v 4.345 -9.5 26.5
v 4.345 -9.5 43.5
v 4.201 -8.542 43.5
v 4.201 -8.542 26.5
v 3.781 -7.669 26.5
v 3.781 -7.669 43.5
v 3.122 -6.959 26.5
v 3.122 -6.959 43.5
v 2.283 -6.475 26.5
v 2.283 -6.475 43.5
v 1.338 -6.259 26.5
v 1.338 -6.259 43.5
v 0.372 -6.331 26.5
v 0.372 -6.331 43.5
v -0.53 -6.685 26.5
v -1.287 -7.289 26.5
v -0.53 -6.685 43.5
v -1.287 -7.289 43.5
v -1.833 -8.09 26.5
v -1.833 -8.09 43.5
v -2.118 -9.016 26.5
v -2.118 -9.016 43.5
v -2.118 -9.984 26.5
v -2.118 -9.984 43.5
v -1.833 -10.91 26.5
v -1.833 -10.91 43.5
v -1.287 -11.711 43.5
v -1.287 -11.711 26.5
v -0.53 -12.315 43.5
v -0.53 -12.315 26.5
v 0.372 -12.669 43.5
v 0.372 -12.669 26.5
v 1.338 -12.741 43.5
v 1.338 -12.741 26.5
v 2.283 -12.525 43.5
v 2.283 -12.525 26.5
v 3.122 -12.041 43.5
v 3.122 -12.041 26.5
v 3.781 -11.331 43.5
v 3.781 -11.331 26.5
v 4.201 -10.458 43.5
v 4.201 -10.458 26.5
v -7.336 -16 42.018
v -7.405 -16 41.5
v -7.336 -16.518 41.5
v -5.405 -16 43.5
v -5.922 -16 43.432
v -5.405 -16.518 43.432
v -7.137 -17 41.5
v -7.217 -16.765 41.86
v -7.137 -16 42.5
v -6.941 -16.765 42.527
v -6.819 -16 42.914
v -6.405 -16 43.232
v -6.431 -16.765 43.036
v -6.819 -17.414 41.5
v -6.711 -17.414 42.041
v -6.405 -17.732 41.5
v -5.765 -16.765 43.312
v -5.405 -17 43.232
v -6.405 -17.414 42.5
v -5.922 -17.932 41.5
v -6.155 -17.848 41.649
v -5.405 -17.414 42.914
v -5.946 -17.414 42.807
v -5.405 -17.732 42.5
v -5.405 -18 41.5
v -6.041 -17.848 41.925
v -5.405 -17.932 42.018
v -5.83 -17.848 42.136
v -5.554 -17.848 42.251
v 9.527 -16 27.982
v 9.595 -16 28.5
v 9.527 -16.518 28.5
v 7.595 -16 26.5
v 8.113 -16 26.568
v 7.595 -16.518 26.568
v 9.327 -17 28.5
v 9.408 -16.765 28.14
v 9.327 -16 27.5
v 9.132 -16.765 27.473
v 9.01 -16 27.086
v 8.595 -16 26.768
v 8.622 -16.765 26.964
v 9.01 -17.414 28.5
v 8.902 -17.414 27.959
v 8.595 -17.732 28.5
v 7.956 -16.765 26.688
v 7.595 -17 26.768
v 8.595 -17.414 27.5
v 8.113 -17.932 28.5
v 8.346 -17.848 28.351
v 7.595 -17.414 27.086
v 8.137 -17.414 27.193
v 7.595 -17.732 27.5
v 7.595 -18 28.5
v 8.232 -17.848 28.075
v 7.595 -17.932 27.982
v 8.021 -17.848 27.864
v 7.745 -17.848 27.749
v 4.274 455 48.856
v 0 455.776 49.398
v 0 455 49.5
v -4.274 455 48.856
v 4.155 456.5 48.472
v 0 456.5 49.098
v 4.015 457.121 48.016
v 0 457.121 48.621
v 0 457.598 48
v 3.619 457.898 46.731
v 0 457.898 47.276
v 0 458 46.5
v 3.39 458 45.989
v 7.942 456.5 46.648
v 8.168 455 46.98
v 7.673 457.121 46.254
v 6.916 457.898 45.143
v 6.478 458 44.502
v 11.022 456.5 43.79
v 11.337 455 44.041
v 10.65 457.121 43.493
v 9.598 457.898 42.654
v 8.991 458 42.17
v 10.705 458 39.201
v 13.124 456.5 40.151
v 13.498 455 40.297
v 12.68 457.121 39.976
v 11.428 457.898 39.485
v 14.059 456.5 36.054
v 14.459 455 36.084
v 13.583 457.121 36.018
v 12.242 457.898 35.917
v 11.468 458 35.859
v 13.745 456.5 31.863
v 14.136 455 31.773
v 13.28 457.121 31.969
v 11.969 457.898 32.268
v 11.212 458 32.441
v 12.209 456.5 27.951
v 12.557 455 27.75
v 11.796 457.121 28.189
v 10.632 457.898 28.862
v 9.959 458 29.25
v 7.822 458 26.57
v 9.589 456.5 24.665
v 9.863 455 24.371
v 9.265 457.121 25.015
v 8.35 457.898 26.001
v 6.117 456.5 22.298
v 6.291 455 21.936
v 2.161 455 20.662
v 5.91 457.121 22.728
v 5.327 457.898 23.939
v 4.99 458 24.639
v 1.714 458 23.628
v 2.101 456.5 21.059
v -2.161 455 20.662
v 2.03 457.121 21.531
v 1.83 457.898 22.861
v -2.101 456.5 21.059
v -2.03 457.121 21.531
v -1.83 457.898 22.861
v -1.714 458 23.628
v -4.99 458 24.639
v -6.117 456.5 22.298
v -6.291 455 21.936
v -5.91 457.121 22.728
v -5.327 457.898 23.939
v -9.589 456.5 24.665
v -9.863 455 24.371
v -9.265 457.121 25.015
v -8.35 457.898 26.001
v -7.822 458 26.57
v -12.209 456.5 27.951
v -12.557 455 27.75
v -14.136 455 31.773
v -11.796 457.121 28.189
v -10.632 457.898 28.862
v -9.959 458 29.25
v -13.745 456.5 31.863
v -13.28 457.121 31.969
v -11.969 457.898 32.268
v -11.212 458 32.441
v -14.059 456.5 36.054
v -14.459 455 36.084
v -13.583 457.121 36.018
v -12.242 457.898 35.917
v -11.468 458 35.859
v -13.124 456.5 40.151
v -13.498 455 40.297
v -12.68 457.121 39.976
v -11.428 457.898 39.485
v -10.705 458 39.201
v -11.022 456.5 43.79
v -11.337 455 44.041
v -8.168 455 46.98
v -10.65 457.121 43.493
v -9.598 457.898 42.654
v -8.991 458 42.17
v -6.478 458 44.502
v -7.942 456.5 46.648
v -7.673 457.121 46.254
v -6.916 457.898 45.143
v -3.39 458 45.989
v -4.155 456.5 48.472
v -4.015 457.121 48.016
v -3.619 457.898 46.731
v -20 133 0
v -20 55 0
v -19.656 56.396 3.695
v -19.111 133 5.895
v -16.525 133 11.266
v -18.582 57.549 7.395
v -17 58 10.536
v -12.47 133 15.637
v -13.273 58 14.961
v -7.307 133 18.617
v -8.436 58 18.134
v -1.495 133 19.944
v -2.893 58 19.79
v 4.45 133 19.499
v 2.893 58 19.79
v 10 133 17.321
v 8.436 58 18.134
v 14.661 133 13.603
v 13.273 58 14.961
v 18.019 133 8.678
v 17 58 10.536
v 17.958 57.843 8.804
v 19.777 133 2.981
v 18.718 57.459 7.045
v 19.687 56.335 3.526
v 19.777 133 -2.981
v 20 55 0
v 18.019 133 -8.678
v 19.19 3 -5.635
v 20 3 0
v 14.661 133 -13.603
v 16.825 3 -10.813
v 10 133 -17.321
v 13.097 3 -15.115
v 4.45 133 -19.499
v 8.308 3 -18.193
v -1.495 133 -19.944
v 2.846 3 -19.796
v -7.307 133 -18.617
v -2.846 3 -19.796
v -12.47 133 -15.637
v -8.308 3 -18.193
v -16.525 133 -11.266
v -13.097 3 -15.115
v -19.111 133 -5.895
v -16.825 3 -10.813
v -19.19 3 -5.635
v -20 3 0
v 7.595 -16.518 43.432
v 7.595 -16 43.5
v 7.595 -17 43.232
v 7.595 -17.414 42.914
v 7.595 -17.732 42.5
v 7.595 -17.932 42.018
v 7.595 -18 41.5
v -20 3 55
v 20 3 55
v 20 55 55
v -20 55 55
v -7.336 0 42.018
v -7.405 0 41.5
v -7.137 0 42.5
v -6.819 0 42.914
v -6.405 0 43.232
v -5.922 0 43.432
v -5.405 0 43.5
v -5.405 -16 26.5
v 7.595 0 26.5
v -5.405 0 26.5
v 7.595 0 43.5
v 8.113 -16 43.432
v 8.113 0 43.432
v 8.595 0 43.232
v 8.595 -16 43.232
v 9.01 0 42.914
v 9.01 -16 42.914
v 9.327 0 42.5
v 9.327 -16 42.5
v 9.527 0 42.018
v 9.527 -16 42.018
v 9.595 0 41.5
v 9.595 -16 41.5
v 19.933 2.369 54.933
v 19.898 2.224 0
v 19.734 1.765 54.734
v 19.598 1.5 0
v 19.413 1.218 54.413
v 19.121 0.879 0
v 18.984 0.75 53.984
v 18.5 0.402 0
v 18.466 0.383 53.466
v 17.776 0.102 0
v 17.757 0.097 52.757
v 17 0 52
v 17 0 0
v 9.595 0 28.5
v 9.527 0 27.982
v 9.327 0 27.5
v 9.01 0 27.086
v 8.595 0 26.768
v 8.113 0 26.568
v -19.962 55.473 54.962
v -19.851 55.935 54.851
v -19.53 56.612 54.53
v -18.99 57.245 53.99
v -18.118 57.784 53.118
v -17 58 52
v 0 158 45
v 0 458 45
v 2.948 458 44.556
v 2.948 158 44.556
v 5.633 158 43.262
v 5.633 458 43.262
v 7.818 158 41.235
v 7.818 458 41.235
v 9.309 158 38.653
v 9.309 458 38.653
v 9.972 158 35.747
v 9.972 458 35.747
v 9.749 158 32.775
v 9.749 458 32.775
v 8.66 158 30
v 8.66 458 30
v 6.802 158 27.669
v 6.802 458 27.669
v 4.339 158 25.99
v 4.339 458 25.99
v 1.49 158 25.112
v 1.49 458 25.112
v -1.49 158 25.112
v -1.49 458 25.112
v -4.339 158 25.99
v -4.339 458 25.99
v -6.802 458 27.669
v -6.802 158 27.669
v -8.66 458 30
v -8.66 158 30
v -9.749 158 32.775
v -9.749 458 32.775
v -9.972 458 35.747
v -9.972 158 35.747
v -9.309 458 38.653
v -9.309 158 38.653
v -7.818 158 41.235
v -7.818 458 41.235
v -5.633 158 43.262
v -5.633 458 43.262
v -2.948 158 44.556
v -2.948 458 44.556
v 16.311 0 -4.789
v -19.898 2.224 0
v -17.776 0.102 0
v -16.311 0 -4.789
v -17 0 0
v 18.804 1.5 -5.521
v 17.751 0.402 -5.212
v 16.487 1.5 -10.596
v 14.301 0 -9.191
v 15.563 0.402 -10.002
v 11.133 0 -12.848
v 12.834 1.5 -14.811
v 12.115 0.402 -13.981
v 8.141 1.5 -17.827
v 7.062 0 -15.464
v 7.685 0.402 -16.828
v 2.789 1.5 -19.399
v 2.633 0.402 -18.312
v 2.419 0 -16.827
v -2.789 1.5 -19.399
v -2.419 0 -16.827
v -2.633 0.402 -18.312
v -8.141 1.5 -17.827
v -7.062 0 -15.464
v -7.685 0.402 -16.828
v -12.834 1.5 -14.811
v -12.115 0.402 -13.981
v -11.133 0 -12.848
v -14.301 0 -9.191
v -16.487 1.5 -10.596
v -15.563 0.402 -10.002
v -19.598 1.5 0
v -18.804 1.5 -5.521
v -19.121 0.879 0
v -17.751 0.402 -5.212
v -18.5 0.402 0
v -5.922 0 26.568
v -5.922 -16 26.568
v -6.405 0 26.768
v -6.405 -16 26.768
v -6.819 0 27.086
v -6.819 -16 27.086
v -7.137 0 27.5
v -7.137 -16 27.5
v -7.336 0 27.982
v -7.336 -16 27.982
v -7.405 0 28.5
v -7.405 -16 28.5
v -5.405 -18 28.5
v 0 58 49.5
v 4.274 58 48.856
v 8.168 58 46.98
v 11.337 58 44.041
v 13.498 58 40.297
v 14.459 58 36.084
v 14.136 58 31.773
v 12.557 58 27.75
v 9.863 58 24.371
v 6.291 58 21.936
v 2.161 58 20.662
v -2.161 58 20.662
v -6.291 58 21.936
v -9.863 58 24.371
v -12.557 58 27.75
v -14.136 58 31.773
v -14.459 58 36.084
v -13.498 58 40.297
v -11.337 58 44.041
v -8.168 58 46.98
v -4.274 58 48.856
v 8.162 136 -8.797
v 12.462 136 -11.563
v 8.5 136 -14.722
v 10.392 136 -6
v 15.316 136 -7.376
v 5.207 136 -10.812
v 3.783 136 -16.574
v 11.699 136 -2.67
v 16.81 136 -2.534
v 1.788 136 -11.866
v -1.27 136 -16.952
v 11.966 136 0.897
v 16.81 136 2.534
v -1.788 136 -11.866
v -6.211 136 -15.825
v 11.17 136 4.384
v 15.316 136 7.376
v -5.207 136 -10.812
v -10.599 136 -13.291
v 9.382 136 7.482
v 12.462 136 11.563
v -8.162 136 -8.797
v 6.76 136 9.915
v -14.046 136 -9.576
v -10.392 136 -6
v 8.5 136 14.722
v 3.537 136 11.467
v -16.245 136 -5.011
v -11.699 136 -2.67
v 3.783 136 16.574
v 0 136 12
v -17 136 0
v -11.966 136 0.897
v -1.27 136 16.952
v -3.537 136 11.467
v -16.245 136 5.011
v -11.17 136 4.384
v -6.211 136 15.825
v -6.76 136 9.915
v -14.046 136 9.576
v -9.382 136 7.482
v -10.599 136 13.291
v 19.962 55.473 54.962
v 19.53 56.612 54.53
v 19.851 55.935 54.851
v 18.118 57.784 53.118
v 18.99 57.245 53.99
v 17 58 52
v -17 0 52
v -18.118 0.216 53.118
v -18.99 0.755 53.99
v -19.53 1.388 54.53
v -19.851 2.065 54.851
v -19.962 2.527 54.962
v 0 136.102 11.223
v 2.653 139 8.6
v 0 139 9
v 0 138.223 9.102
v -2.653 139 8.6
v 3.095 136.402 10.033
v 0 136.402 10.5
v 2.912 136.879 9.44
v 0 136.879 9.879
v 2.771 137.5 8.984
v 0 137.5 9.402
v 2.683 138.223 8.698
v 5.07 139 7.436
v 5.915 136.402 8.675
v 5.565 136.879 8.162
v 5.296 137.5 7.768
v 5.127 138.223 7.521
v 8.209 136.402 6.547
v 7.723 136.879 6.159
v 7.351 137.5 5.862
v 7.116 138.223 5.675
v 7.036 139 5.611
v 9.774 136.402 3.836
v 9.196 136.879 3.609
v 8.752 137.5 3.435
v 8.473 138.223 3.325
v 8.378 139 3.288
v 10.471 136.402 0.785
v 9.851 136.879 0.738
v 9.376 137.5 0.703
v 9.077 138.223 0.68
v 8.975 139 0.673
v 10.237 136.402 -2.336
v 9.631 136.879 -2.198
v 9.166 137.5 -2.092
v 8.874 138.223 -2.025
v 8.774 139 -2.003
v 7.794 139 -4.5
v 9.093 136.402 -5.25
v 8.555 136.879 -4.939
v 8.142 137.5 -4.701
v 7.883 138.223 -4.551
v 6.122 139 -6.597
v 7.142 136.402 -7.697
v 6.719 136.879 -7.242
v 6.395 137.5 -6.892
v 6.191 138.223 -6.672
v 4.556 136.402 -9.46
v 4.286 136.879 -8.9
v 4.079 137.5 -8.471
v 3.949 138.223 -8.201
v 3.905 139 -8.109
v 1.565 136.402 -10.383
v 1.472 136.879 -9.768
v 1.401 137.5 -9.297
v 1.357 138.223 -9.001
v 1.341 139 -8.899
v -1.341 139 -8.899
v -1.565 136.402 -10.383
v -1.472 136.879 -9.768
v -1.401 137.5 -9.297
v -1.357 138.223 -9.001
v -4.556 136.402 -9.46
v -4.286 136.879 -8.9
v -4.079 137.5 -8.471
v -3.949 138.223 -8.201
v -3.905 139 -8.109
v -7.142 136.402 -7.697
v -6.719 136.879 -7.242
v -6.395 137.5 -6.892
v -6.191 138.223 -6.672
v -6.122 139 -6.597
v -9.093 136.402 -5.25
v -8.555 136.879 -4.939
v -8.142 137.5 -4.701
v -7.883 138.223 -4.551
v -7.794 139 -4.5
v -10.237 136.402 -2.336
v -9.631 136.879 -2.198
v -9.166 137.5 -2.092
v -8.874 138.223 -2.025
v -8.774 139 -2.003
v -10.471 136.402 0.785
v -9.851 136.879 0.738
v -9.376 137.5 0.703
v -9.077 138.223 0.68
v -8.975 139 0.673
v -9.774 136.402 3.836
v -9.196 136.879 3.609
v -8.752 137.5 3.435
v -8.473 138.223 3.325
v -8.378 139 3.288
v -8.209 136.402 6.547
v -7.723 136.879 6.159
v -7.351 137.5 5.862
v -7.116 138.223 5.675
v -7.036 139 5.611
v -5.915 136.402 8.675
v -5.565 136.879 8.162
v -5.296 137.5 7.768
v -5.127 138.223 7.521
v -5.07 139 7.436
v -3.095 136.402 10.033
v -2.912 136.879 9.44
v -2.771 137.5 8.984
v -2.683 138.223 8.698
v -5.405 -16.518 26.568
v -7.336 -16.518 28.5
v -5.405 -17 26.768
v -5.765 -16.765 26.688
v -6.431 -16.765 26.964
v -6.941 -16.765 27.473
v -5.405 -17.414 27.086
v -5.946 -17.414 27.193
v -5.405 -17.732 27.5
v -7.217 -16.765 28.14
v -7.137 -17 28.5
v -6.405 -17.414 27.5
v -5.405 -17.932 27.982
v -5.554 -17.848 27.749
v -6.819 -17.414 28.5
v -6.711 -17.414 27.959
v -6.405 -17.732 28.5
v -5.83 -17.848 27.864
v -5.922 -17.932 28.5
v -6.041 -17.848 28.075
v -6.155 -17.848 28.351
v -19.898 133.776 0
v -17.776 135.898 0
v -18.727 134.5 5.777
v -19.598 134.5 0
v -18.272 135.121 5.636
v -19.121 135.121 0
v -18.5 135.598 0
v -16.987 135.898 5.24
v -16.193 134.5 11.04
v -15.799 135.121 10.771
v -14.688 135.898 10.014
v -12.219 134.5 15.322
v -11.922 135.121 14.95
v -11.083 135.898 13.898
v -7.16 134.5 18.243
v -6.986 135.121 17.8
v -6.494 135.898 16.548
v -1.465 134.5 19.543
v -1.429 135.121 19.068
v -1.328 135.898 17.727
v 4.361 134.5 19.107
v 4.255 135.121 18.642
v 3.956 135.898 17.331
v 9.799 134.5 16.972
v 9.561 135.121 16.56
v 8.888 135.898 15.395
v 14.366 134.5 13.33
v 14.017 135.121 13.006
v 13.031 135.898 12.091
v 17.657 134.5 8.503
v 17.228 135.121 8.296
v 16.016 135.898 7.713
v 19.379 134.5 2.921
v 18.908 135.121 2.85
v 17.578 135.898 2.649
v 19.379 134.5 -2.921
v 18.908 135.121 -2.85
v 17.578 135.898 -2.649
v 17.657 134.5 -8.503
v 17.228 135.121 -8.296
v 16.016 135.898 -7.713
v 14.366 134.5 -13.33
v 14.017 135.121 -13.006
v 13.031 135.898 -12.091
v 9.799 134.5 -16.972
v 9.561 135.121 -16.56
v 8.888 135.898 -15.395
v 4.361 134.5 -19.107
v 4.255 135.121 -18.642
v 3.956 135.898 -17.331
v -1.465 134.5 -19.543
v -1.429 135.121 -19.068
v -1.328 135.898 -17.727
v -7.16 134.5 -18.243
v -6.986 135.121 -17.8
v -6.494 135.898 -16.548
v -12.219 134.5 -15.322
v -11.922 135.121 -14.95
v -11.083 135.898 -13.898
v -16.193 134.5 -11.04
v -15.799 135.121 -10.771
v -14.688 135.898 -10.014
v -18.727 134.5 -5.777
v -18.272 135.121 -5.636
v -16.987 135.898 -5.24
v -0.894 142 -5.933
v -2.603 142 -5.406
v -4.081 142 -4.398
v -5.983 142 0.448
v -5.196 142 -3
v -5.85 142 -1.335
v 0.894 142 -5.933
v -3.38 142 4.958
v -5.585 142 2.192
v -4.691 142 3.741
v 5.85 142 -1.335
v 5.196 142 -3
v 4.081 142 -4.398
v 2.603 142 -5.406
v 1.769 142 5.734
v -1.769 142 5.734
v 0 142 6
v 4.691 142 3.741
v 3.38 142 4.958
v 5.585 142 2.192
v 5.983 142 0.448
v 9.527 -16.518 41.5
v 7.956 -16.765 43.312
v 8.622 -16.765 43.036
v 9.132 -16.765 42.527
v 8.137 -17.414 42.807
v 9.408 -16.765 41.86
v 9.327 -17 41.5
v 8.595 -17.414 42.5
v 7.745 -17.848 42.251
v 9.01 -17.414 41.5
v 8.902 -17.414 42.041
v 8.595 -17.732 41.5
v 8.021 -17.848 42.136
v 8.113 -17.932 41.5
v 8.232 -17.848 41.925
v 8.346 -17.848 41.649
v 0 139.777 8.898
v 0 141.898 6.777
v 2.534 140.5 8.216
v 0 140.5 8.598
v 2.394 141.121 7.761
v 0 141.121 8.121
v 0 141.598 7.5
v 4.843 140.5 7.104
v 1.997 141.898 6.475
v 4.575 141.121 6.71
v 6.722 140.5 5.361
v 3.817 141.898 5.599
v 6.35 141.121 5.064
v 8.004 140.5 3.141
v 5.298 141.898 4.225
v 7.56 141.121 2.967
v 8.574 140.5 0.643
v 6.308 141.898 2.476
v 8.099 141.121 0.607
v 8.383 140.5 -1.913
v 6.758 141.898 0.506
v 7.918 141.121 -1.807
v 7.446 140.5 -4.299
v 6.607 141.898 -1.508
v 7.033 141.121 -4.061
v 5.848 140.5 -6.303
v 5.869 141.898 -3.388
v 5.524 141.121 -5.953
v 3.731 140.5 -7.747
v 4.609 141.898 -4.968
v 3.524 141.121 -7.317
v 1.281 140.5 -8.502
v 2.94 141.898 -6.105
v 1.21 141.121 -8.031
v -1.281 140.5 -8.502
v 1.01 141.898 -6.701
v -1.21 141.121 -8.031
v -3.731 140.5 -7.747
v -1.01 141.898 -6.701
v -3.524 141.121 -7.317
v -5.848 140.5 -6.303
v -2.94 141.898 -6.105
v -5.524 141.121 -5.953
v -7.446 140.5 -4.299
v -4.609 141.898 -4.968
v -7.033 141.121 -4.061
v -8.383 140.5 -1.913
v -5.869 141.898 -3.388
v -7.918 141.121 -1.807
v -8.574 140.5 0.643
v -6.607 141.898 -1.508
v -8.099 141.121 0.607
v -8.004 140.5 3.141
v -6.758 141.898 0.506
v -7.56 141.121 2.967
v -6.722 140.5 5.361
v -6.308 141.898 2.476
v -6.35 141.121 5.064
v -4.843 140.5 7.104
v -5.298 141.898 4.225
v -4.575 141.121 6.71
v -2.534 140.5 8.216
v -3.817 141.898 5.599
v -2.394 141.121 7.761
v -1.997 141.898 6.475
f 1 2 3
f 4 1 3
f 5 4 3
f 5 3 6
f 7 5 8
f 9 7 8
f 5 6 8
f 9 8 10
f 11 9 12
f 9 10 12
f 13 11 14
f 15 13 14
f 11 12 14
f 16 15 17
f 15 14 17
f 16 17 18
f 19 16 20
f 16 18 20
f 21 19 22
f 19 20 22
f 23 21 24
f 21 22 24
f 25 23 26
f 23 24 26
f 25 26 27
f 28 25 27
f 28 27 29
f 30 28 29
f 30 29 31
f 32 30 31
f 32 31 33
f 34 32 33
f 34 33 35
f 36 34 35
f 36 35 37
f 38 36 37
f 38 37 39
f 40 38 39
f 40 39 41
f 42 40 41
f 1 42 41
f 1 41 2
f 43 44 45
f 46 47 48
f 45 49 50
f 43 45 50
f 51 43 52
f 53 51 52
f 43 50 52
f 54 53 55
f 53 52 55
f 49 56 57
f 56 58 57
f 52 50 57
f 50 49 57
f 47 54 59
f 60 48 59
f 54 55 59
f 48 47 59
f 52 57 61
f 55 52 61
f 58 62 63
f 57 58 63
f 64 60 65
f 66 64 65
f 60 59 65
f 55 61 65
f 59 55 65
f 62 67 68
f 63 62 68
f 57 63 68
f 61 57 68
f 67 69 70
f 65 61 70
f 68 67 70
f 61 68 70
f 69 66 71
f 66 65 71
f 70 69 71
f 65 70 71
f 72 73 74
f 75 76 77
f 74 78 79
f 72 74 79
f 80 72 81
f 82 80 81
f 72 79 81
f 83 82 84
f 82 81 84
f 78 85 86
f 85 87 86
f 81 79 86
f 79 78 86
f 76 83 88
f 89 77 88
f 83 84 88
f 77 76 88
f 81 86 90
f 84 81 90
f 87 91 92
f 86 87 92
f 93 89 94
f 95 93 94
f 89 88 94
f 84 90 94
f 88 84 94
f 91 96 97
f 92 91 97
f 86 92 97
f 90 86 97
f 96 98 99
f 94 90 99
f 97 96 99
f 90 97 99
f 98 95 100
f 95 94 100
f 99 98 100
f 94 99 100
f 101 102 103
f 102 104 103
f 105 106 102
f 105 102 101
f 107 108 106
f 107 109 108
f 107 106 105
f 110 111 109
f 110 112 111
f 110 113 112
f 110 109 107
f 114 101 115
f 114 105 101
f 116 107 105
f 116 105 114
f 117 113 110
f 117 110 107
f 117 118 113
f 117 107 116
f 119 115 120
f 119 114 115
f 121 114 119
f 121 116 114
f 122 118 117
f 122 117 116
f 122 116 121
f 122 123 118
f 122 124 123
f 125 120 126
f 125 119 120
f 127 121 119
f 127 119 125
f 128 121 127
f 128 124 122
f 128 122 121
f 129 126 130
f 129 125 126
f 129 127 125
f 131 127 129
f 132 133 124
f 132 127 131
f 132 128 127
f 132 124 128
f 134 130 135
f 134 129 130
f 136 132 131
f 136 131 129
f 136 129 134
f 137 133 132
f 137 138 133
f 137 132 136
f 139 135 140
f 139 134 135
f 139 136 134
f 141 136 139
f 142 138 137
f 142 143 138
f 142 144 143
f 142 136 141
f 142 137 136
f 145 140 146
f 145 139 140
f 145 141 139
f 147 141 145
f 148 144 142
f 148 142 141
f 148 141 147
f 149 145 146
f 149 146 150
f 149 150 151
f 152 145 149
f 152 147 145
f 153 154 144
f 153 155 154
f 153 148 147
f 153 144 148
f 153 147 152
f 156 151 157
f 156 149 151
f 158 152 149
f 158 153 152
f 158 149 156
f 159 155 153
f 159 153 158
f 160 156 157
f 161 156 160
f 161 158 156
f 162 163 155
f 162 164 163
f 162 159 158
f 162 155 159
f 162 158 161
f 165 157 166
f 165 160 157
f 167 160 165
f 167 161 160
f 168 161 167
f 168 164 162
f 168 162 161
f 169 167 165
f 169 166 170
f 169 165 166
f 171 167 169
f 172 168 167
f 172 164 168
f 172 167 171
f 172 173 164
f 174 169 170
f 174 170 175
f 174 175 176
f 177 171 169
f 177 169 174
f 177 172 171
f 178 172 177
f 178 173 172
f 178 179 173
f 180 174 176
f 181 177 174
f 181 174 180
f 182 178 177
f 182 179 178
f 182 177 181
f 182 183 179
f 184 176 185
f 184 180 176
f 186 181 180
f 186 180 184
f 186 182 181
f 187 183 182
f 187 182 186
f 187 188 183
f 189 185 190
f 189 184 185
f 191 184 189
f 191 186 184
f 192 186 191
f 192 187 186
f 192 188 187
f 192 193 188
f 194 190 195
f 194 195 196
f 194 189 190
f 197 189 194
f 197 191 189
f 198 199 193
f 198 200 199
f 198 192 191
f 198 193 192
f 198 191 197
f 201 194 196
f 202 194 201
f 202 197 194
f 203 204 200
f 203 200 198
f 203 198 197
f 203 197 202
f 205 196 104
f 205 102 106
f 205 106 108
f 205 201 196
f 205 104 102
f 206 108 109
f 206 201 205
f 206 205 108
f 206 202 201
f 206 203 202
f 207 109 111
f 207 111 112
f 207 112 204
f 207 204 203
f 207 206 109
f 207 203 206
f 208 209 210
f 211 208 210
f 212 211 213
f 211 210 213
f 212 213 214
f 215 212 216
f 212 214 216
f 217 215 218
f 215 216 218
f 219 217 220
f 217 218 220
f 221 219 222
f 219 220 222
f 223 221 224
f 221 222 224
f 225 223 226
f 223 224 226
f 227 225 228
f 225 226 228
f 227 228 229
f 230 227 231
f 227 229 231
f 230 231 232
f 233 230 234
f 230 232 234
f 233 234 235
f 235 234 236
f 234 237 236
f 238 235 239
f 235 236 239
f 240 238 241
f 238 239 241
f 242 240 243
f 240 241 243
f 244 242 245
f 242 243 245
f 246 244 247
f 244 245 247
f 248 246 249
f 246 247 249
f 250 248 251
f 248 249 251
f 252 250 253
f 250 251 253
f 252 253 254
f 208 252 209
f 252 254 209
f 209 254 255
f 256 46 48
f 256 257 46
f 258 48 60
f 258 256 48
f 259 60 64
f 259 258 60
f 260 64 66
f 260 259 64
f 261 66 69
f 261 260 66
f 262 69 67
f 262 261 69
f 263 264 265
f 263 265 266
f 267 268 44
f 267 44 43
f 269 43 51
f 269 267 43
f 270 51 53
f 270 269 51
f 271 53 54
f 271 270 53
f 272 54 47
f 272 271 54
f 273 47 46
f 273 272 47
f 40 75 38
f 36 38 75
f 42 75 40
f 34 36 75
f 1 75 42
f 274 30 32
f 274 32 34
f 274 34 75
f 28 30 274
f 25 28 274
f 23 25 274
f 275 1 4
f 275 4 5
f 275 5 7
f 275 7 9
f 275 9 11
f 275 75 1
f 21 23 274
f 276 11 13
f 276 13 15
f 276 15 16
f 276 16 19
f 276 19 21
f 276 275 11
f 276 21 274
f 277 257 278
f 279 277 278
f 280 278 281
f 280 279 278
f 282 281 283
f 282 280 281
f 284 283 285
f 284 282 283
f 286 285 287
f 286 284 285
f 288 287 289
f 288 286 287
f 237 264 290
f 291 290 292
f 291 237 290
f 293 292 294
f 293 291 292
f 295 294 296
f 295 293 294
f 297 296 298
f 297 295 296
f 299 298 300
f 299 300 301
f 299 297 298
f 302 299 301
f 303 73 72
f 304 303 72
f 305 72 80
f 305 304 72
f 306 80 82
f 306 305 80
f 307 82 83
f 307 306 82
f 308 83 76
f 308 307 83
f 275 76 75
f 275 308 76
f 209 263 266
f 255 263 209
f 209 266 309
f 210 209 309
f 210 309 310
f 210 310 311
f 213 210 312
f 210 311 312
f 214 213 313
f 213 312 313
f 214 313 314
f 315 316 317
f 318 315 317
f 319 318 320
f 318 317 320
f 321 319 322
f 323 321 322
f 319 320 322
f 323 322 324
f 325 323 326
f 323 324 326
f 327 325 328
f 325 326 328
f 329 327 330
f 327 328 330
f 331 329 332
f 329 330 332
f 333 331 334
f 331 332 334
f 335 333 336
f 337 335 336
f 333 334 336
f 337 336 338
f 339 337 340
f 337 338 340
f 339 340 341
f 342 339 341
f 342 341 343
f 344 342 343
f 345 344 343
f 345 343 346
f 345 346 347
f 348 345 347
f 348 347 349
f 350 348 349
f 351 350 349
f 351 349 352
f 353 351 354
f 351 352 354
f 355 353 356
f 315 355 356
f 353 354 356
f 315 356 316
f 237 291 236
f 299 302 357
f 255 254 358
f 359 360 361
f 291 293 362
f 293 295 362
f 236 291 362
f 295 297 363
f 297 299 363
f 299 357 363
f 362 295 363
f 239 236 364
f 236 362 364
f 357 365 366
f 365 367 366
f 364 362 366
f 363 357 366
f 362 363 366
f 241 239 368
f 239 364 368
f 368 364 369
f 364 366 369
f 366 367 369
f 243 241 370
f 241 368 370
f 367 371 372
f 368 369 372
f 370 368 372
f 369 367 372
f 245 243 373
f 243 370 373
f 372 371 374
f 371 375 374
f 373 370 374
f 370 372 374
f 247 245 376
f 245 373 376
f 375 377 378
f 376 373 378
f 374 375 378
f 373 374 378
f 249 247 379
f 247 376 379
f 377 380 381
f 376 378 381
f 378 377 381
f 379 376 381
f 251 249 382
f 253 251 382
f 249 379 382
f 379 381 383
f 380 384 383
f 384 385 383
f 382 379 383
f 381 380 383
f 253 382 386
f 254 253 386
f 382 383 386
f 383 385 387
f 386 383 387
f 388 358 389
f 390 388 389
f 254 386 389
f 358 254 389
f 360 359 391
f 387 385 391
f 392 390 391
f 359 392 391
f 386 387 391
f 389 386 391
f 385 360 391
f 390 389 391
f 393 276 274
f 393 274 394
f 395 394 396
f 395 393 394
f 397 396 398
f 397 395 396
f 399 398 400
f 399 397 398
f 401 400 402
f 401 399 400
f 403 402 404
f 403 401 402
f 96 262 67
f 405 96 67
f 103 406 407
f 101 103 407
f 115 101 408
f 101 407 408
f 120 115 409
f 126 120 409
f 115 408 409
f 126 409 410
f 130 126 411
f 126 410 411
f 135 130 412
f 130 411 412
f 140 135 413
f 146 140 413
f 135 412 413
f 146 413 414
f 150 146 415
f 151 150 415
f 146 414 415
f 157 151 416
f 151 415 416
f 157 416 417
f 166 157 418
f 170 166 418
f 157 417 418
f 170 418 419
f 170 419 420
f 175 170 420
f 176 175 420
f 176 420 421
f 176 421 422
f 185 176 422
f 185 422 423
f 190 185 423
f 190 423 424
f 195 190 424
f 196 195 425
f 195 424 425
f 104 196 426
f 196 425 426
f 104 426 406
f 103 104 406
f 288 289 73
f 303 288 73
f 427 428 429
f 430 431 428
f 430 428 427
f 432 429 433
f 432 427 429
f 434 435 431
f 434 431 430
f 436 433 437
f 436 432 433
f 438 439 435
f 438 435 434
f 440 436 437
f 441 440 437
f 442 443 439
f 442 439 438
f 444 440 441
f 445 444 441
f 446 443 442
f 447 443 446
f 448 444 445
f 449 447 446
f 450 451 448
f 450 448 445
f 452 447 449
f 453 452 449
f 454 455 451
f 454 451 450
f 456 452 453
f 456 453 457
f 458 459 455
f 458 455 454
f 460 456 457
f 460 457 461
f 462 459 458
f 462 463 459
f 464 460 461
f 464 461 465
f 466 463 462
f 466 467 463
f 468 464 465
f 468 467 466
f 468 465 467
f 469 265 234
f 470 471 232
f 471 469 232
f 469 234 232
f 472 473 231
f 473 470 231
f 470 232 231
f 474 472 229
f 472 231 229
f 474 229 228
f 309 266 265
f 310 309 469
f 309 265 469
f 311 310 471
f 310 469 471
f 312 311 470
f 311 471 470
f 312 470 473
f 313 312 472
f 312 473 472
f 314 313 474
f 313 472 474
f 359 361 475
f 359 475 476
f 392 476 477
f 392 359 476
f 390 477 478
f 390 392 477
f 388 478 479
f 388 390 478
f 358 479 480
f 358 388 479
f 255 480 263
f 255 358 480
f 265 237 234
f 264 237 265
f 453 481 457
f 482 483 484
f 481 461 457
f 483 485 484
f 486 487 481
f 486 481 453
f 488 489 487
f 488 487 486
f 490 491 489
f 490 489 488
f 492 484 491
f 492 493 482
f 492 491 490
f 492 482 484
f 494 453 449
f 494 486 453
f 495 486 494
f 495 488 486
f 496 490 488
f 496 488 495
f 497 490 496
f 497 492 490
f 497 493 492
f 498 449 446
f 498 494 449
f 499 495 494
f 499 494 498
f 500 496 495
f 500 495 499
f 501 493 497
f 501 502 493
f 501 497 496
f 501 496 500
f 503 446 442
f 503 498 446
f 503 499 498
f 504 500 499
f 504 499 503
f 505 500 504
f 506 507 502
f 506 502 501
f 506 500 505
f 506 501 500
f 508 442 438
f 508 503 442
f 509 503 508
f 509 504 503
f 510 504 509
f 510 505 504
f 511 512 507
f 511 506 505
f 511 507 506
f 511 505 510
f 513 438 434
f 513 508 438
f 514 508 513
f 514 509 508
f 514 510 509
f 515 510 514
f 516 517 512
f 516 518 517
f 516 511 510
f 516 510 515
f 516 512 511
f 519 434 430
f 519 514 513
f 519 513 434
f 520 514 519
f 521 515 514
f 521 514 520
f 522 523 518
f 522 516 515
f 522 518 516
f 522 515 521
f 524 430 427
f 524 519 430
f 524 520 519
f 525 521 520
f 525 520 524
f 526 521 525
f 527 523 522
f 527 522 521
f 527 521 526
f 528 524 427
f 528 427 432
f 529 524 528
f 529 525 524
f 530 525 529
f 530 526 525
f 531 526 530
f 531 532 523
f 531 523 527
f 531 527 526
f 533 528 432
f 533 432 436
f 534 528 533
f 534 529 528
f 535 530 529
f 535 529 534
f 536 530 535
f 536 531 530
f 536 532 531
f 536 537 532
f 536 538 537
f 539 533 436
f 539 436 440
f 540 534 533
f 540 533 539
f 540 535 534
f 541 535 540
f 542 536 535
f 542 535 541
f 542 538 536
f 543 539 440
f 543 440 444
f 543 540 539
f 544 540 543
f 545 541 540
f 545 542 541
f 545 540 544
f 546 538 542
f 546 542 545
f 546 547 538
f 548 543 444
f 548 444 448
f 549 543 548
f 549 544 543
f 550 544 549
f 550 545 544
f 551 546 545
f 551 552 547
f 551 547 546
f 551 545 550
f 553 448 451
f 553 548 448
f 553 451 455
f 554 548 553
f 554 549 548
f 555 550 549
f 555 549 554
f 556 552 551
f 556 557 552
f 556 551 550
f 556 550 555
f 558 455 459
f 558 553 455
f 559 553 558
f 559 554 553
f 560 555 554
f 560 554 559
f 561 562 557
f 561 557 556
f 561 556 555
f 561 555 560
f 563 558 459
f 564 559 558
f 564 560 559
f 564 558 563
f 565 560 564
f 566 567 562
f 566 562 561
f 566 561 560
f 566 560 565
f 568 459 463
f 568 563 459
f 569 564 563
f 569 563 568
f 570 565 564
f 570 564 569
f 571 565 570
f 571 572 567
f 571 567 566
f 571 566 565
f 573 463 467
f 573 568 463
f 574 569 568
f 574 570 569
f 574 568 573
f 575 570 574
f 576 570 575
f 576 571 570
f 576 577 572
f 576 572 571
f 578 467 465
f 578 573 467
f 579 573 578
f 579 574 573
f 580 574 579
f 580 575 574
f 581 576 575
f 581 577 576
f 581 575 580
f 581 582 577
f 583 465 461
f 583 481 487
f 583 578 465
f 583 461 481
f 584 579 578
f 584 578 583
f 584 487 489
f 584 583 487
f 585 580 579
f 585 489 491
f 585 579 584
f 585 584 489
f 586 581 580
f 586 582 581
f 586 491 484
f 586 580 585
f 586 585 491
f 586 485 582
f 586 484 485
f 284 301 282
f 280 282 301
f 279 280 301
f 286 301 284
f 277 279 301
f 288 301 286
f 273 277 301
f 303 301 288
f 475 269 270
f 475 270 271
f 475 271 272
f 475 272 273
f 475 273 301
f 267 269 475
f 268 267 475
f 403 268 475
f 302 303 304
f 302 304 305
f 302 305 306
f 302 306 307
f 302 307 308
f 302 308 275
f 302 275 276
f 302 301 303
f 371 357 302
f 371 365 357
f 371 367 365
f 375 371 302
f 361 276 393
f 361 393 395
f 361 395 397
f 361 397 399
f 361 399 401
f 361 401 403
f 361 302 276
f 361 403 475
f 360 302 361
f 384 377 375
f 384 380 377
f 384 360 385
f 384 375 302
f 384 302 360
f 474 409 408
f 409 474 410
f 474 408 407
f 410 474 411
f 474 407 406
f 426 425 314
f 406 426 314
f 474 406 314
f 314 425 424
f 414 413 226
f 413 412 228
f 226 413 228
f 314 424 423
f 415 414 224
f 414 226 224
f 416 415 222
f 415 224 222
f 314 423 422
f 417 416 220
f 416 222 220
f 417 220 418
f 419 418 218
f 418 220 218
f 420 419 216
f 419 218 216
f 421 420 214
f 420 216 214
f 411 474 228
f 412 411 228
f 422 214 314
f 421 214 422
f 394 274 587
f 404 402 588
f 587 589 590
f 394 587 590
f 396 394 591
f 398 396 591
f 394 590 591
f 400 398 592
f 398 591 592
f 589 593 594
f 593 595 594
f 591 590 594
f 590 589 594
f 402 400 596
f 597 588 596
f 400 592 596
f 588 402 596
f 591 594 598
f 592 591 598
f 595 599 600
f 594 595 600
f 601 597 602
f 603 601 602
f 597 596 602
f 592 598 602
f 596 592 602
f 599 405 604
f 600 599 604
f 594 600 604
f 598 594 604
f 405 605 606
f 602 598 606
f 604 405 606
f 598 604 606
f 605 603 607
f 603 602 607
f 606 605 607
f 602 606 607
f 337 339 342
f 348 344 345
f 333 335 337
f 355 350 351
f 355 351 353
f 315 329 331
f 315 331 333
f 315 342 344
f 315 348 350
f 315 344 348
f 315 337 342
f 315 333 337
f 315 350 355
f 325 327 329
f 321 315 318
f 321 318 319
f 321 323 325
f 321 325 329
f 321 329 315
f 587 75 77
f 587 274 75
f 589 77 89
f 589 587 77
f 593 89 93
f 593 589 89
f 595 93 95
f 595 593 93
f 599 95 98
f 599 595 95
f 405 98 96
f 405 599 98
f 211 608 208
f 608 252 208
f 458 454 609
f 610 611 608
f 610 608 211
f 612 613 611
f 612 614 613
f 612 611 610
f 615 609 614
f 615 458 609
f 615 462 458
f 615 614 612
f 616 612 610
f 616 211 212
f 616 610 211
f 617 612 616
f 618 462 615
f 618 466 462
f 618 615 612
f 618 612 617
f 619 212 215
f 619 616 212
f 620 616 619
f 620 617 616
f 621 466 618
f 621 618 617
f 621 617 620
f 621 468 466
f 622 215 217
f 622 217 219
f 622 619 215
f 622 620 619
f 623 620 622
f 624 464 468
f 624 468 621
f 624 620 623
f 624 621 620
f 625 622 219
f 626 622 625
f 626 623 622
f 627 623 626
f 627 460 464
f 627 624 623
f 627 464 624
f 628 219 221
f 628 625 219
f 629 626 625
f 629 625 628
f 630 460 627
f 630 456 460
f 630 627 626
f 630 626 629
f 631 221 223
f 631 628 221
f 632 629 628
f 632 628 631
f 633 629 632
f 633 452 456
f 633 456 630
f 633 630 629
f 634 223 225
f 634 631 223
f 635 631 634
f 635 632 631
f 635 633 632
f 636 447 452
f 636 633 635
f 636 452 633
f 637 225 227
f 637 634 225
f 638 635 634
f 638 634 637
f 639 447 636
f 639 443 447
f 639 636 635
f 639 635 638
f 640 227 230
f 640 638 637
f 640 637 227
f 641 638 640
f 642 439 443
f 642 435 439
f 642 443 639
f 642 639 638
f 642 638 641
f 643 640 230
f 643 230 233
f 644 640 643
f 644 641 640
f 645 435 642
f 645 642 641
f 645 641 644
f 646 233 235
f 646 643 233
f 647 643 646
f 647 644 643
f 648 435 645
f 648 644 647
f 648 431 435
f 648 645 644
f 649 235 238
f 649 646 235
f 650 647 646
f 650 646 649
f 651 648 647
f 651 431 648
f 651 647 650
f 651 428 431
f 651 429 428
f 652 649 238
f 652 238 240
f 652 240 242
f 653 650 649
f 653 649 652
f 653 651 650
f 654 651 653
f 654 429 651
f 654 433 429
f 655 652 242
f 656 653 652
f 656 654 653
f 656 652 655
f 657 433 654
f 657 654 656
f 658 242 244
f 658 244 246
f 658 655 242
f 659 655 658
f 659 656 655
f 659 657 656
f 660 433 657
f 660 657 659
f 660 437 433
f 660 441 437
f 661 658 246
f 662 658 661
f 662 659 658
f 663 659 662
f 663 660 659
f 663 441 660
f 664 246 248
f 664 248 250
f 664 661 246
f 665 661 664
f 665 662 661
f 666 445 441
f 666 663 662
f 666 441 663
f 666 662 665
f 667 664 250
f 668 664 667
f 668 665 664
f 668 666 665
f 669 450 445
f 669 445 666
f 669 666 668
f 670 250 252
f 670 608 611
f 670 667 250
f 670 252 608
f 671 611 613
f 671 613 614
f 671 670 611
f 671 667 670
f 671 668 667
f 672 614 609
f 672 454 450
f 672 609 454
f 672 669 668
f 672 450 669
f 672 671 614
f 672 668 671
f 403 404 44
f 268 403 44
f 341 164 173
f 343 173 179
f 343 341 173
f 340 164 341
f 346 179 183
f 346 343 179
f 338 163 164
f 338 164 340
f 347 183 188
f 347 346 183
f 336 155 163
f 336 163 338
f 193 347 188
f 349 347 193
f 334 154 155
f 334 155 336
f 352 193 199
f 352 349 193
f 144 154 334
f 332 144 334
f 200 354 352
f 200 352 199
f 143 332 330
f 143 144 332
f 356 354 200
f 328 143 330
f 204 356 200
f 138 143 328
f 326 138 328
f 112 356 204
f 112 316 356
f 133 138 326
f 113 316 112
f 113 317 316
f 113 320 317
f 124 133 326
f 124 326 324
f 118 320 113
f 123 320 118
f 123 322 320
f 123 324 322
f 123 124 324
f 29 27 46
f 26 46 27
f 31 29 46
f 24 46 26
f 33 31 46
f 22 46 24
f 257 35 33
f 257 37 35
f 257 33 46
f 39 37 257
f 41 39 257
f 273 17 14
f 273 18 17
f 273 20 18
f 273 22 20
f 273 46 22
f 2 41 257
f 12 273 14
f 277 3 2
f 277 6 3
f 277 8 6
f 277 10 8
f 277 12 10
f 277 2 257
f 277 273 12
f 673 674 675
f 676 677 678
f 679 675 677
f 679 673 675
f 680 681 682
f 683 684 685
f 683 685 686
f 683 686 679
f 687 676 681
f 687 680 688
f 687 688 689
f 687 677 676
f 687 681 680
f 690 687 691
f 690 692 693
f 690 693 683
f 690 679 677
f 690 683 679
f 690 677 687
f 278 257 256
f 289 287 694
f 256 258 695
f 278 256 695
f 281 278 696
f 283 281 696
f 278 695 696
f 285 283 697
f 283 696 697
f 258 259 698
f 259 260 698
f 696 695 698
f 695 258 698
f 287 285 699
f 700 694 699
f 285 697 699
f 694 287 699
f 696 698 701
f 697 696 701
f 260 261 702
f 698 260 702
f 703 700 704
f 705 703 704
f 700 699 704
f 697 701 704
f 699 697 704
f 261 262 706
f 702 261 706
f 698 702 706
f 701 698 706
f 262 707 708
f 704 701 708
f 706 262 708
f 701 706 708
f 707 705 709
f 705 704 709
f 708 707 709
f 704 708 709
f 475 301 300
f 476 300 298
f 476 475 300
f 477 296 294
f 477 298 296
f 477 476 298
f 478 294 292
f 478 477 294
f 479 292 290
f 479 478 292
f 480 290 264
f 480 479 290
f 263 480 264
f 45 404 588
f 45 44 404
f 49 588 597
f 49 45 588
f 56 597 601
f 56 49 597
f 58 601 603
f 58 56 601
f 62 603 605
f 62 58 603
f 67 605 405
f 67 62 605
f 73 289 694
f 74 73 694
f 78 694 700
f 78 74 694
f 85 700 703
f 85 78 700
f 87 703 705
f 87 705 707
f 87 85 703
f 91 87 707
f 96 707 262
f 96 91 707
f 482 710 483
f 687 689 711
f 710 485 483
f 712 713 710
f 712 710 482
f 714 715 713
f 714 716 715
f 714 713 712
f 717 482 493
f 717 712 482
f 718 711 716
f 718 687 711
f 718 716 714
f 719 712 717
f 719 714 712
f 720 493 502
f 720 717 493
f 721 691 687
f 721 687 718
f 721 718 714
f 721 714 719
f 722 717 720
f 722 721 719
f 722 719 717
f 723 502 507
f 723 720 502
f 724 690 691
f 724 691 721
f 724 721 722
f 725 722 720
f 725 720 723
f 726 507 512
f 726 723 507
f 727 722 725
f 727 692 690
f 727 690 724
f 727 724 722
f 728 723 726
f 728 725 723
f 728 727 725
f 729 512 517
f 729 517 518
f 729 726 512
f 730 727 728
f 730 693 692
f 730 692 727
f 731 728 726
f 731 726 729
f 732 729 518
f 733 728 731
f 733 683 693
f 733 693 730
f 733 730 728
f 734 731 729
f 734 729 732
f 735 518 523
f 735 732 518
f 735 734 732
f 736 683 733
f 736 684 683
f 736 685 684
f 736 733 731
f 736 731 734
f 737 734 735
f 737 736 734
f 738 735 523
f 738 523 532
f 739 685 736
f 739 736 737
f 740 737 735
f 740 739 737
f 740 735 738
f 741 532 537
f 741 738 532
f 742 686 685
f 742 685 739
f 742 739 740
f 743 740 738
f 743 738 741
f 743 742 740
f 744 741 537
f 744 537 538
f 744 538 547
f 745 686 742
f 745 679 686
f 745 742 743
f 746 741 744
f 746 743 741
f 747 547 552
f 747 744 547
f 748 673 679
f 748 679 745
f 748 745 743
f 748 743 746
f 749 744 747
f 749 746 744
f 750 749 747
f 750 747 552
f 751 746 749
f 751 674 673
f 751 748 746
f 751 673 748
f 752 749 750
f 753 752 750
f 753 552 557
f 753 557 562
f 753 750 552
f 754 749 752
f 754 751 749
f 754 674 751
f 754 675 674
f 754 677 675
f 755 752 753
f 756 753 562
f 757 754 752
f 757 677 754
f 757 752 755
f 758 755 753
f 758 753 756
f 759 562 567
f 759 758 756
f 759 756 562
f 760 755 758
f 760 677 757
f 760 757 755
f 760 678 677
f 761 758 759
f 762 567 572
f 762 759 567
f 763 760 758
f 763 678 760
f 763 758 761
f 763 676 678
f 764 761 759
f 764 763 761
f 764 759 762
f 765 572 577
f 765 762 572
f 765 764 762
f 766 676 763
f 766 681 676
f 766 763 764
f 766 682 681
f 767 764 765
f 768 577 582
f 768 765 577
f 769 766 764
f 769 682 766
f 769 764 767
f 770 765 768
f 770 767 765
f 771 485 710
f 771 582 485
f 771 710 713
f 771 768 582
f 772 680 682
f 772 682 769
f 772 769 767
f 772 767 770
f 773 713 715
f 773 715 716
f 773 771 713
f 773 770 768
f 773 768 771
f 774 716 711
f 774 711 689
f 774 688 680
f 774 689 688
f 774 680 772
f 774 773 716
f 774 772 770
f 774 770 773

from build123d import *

# Parameters (mm, degrees)
EXTRUDE_1_DEPTH     = 58
SKETCH_2_R          = 20
EXTRUDE_7_DEPTH     = 78
SKETCH_3_R          = 14.5
EXTRUDE_8_DEPTH     = 400
SKETCH_4_R          = 10
CUT_EXTRUDE_1_DEPTH = 300
FILLET_2_R          = 3
FILLET_START        = -21
FILLET_3_DEPTH      = 77
FILLET_3_2_DEPTH    = 41
FILLET_3_3_ANGLE    = 180
FILLET_4_R          = 3
SKETCH_6_R          = 9
EXTRUDE_10_DEPTH    = 6
FILLET_5_R          = 3
FILLET_6_R          = 3
EXTRUDE_11_DEPTH    = 18
FILLET_7_R          = 2
SKETCH_9_R          = 3.25
CUT_EXTRUDE_2_DEPTH = 463.813407343


with BuildPart() as part:
    # 草图1 → 凸台-拉伸1 (new body)
    with BuildSketch(Plane(origin=(0, 0, 0), x_dir=(1, 0, 0), z_dir=(0, 1, 0))):
        with BuildLine():
            Line((20, 0), (20, -55))
            Line((20, -55), (-20, -55))
            Line((-20, -55), (-20, 0))
            ThreePointArc((-20, 0), (0, 20), (20, 0))
        make_face()
    extrude(amount=EXTRUDE_1_DEPTH)

    # 草图2 → 凸台-拉伸7 (add)
    with BuildSketch(Plane(origin=(0, 58, 0), x_dir=(1, 0, 0), z_dir=(0, 1, 0))):
        with Locations(Location((0, 0, 0), (0, 0, 180))):
            Circle(SKETCH_2_R)
    extrude(amount=EXTRUDE_7_DEPTH)

    # 草图3 → 凸台-拉伸8 (add)
    with BuildSketch(Plane(origin=(0, 58, 0), x_dir=(1, 0, 0), z_dir=(0, 1, 0))):
        with Locations(Location((0, -35, 0), (0, 0, 270))):
            Circle(SKETCH_3_R)
    extrude(amount=EXTRUDE_8_DEPTH)

    # 草图4 → 切除-拉伸1 (cut)
    with BuildSketch(Plane(origin=(0, 458, 0), x_dir=(1, 0, 0), z_dir=(0, 1, 0))):
        with Locations(Location((0, -35, 0), (0, 0, 270))):
            Circle(SKETCH_4_R)
    extrude(amount=-CUT_EXTRUDE_1_DEPTH, mode=Mode.SUBTRACT)

    # 圆角2
    # the kernel refuses this fillet: 3 mm, written as the material it takes off along each edge
    with BuildSketch(Plane(origin=(27.5, 58, 55), x_dir=(0, -1, 0), z_dir=(-1, 0, 0))) as fillet_2_piece_1:
        with BuildLine():
            CenterArc((FILLET_2_R, -FILLET_2_R), FILLET_2_R, 90, 90)
            Line((0, -FILLET_2_R), (0, 0))
            Line((0, 0), (FILLET_2_R, 0))
        make_face()
    extrude(amount=55, mode=Mode.SUBTRACT)
    with BuildSketch(Plane(origin=(20, 58, -12.75), x_dir=(0, -1, 0), z_dir=(0, 0, 1))) as fillet_2_piece_2_section:
        with BuildLine():
            CenterArc((FILLET_2_R, -FILLET_2_R), FILLET_2_R, 90, 90)
            Line((0, -FILLET_2_R), (0, 0))
            Line((0, 0), (FILLET_2_R, 0))
        make_face()
    fillet_2_piece_2 = extrude(amount=75.25, mode=Mode.PRIVATE)
    fillet_2_piece_2 = fillet_2_piece_2 - Plane(origin=(0, 58, 0), x_dir=(-1, 0, 0), z_dir=(0, -1, 0)) * Cylinder(20, 163, mode=Mode.PRIVATE)
    add(fillet_2_piece_2, mode=Mode.SUBTRACT)
    with BuildSketch(Plane(origin=(-20, 58, 62.5), x_dir=(1, 0, 0), z_dir=(0, 0, -1))) as fillet_2_piece_3_section:
        with BuildLine():
            CenterArc((FILLET_2_R, FILLET_2_R), FILLET_2_R, 180, 90)
            Line((0, FILLET_2_R), (0, 0))
            Line((0, 0), (FILLET_2_R, 0))
        make_face()
    fillet_2_piece_3 = extrude(amount=75.25, mode=Mode.PRIVATE)
    fillet_2_piece_3 = fillet_2_piece_3 - Plane(origin=(0, 58, 0), x_dir=(-1, 0, 0), z_dir=(0, -1, 0)) * Cylinder(20, 163, mode=Mode.PRIVATE)
    add(fillet_2_piece_3, mode=Mode.SUBTRACT)

    # 圆角3: read off the stored shape, not the designer's step
    # 圆角3 outline → 圆角3 (cut)
    with BuildSketch(Plane.XY.offset(FILLET_START)):
        with BuildLine():
            Line((20, 0), (20, 3))
            ThreePointArc((20, 3), (19.121320344, 0.878679656), (17, 0))
            Line((17, 0), (20, 0))
        make_face()
        with BuildLine():
            Line((-20, 0), (-17, 0))
            ThreePointArc((-17, 0), (-19.121320344, 0.878679656), (-20, 3))
            Line((-20, 3), (-20, 0))
        make_face()
    extrude(amount=FILLET_3_DEPTH, mode=Mode.SUBTRACT)

    # Fillet 3 2 outline → Fillet 3 2 (cut)
    with BuildSketch(Plane.YZ.offset(FILLET_START)):
        with BuildLine():
            ThreePointArc((0, 52), (0.878679656, 54.121320344), (3, 55))
            Line((3, 55), (0, 55))
            Line((0, 55), (0, 52))
        make_face()
    extrude(amount=FILLET_3_2_DEPTH, mode=Mode.SUBTRACT)

    # Fillet 3 3 outline → Fillet 3 3 (revolve, cut)
    with BuildSketch(Plane.XY):
        with BuildLine():
            ThreePointArc((20, 3), (19.121320344, 0.878679656), (17, 0))
            Line((17, 0), (20, 0))
            Line((20, 0), (20, 3))
        make_face()
    revolve(axis=Axis((0, 0, 0), (0, 1, 0)), revolution_arc=FILLET_3_3_ANGLE, mode=Mode.SUBTRACT)

    # 圆角4
    fillet_4_edges = [part.edges().sort_by_distance(p)[0] for p in [
        (20, 136, 0),
    ]]
    fillet(fillet_4_edges, radius=FILLET_4_R)

    # 草图6 → 凸台-拉伸10 (add)
    with BuildSketch(Plane(origin=(0, 136, 0), x_dir=(1, 0, 0), z_dir=(0, 1, 0))):
        with Locations(Location((0, 0, 0), (0, 0, 270))):
            Circle(SKETCH_6_R)
    extrude(amount=EXTRUDE_10_DEPTH)

    # 圆角5
    fillet_5_edges = [part.edges().sort_by_distance(p)[0] for p in [
        (0, 136, -9),
        (0, 142, -9),
    ]]
    fillet(fillet_5_edges, radius=FILLET_5_R - 0.0001)  # a hair under: the kernel refuses the full size

    # 圆角6
    fillet_6_edges = [part.edges().sort_by_distance(p)[0] for p in [
        (0, 458, 20.5),
    ]]
    fillet(fillet_6_edges, radius=FILLET_6_R)

    # 草图7 → 凸台-拉伸11 (add)
    with BuildSketch(Plane.XZ):
        with BuildLine():
            Line((-5.404550966, 43.5), (7.595449034, 43.5))
            ThreePointArc((7.595449034, 43.5), (9.009662596, 42.914213562), (9.595449034, 41.5))
            Line((9.595449034, 41.5), (9.595449034, 28.5))
            ThreePointArc((9.595449034, 28.5), (9.009662596, 27.085786438), (7.595449034, 26.5))
            Line((7.595449034, 26.5), (-5.404550966, 26.5))
            ThreePointArc((-5.404550966, 26.5), (-6.818764529, 27.085786438), (-7.404550966, 28.5))
            Line((-7.404550966, 28.5), (-7.404550966, 41.5))
            ThreePointArc((-7.404550966, 41.5), (-6.818764529, 42.914213562), (-5.404550966, 43.5))
        make_face()
    extrude(amount=EXTRUDE_11_DEPTH)

    # 圆角7
    fillet_7_edges = [part.edges().sort_by_distance(p)[0] for p in [
        (-6.818764529, -18, 42.914213562),
        (-7.404550966, -18, 35),
        (-6.818764529, -18, 27.085786438),
        (1.095449034, -18, 26.5),
        (9.009662596, -18, 27.085786438),
        (9.595449034, -18, 35),
        (9.009662596, -18, 42.914213562),
        (1.095449034, -18, 43.5),
    ]]
    fillet(fillet_7_edges, radius=FILLET_7_R)

    # 草图9 → 切除-拉伸2 (cut, through all)
    with BuildSketch(Plane.XY.offset(43.5)):
        with Locations((1.095449034, -9.5)):
            Circle(SKETCH_9_R)
    extrude(amount=-CUT_EXTRUDE_2_DEPTH, mode=Mode.SUBTRACT)


solid = part.part
